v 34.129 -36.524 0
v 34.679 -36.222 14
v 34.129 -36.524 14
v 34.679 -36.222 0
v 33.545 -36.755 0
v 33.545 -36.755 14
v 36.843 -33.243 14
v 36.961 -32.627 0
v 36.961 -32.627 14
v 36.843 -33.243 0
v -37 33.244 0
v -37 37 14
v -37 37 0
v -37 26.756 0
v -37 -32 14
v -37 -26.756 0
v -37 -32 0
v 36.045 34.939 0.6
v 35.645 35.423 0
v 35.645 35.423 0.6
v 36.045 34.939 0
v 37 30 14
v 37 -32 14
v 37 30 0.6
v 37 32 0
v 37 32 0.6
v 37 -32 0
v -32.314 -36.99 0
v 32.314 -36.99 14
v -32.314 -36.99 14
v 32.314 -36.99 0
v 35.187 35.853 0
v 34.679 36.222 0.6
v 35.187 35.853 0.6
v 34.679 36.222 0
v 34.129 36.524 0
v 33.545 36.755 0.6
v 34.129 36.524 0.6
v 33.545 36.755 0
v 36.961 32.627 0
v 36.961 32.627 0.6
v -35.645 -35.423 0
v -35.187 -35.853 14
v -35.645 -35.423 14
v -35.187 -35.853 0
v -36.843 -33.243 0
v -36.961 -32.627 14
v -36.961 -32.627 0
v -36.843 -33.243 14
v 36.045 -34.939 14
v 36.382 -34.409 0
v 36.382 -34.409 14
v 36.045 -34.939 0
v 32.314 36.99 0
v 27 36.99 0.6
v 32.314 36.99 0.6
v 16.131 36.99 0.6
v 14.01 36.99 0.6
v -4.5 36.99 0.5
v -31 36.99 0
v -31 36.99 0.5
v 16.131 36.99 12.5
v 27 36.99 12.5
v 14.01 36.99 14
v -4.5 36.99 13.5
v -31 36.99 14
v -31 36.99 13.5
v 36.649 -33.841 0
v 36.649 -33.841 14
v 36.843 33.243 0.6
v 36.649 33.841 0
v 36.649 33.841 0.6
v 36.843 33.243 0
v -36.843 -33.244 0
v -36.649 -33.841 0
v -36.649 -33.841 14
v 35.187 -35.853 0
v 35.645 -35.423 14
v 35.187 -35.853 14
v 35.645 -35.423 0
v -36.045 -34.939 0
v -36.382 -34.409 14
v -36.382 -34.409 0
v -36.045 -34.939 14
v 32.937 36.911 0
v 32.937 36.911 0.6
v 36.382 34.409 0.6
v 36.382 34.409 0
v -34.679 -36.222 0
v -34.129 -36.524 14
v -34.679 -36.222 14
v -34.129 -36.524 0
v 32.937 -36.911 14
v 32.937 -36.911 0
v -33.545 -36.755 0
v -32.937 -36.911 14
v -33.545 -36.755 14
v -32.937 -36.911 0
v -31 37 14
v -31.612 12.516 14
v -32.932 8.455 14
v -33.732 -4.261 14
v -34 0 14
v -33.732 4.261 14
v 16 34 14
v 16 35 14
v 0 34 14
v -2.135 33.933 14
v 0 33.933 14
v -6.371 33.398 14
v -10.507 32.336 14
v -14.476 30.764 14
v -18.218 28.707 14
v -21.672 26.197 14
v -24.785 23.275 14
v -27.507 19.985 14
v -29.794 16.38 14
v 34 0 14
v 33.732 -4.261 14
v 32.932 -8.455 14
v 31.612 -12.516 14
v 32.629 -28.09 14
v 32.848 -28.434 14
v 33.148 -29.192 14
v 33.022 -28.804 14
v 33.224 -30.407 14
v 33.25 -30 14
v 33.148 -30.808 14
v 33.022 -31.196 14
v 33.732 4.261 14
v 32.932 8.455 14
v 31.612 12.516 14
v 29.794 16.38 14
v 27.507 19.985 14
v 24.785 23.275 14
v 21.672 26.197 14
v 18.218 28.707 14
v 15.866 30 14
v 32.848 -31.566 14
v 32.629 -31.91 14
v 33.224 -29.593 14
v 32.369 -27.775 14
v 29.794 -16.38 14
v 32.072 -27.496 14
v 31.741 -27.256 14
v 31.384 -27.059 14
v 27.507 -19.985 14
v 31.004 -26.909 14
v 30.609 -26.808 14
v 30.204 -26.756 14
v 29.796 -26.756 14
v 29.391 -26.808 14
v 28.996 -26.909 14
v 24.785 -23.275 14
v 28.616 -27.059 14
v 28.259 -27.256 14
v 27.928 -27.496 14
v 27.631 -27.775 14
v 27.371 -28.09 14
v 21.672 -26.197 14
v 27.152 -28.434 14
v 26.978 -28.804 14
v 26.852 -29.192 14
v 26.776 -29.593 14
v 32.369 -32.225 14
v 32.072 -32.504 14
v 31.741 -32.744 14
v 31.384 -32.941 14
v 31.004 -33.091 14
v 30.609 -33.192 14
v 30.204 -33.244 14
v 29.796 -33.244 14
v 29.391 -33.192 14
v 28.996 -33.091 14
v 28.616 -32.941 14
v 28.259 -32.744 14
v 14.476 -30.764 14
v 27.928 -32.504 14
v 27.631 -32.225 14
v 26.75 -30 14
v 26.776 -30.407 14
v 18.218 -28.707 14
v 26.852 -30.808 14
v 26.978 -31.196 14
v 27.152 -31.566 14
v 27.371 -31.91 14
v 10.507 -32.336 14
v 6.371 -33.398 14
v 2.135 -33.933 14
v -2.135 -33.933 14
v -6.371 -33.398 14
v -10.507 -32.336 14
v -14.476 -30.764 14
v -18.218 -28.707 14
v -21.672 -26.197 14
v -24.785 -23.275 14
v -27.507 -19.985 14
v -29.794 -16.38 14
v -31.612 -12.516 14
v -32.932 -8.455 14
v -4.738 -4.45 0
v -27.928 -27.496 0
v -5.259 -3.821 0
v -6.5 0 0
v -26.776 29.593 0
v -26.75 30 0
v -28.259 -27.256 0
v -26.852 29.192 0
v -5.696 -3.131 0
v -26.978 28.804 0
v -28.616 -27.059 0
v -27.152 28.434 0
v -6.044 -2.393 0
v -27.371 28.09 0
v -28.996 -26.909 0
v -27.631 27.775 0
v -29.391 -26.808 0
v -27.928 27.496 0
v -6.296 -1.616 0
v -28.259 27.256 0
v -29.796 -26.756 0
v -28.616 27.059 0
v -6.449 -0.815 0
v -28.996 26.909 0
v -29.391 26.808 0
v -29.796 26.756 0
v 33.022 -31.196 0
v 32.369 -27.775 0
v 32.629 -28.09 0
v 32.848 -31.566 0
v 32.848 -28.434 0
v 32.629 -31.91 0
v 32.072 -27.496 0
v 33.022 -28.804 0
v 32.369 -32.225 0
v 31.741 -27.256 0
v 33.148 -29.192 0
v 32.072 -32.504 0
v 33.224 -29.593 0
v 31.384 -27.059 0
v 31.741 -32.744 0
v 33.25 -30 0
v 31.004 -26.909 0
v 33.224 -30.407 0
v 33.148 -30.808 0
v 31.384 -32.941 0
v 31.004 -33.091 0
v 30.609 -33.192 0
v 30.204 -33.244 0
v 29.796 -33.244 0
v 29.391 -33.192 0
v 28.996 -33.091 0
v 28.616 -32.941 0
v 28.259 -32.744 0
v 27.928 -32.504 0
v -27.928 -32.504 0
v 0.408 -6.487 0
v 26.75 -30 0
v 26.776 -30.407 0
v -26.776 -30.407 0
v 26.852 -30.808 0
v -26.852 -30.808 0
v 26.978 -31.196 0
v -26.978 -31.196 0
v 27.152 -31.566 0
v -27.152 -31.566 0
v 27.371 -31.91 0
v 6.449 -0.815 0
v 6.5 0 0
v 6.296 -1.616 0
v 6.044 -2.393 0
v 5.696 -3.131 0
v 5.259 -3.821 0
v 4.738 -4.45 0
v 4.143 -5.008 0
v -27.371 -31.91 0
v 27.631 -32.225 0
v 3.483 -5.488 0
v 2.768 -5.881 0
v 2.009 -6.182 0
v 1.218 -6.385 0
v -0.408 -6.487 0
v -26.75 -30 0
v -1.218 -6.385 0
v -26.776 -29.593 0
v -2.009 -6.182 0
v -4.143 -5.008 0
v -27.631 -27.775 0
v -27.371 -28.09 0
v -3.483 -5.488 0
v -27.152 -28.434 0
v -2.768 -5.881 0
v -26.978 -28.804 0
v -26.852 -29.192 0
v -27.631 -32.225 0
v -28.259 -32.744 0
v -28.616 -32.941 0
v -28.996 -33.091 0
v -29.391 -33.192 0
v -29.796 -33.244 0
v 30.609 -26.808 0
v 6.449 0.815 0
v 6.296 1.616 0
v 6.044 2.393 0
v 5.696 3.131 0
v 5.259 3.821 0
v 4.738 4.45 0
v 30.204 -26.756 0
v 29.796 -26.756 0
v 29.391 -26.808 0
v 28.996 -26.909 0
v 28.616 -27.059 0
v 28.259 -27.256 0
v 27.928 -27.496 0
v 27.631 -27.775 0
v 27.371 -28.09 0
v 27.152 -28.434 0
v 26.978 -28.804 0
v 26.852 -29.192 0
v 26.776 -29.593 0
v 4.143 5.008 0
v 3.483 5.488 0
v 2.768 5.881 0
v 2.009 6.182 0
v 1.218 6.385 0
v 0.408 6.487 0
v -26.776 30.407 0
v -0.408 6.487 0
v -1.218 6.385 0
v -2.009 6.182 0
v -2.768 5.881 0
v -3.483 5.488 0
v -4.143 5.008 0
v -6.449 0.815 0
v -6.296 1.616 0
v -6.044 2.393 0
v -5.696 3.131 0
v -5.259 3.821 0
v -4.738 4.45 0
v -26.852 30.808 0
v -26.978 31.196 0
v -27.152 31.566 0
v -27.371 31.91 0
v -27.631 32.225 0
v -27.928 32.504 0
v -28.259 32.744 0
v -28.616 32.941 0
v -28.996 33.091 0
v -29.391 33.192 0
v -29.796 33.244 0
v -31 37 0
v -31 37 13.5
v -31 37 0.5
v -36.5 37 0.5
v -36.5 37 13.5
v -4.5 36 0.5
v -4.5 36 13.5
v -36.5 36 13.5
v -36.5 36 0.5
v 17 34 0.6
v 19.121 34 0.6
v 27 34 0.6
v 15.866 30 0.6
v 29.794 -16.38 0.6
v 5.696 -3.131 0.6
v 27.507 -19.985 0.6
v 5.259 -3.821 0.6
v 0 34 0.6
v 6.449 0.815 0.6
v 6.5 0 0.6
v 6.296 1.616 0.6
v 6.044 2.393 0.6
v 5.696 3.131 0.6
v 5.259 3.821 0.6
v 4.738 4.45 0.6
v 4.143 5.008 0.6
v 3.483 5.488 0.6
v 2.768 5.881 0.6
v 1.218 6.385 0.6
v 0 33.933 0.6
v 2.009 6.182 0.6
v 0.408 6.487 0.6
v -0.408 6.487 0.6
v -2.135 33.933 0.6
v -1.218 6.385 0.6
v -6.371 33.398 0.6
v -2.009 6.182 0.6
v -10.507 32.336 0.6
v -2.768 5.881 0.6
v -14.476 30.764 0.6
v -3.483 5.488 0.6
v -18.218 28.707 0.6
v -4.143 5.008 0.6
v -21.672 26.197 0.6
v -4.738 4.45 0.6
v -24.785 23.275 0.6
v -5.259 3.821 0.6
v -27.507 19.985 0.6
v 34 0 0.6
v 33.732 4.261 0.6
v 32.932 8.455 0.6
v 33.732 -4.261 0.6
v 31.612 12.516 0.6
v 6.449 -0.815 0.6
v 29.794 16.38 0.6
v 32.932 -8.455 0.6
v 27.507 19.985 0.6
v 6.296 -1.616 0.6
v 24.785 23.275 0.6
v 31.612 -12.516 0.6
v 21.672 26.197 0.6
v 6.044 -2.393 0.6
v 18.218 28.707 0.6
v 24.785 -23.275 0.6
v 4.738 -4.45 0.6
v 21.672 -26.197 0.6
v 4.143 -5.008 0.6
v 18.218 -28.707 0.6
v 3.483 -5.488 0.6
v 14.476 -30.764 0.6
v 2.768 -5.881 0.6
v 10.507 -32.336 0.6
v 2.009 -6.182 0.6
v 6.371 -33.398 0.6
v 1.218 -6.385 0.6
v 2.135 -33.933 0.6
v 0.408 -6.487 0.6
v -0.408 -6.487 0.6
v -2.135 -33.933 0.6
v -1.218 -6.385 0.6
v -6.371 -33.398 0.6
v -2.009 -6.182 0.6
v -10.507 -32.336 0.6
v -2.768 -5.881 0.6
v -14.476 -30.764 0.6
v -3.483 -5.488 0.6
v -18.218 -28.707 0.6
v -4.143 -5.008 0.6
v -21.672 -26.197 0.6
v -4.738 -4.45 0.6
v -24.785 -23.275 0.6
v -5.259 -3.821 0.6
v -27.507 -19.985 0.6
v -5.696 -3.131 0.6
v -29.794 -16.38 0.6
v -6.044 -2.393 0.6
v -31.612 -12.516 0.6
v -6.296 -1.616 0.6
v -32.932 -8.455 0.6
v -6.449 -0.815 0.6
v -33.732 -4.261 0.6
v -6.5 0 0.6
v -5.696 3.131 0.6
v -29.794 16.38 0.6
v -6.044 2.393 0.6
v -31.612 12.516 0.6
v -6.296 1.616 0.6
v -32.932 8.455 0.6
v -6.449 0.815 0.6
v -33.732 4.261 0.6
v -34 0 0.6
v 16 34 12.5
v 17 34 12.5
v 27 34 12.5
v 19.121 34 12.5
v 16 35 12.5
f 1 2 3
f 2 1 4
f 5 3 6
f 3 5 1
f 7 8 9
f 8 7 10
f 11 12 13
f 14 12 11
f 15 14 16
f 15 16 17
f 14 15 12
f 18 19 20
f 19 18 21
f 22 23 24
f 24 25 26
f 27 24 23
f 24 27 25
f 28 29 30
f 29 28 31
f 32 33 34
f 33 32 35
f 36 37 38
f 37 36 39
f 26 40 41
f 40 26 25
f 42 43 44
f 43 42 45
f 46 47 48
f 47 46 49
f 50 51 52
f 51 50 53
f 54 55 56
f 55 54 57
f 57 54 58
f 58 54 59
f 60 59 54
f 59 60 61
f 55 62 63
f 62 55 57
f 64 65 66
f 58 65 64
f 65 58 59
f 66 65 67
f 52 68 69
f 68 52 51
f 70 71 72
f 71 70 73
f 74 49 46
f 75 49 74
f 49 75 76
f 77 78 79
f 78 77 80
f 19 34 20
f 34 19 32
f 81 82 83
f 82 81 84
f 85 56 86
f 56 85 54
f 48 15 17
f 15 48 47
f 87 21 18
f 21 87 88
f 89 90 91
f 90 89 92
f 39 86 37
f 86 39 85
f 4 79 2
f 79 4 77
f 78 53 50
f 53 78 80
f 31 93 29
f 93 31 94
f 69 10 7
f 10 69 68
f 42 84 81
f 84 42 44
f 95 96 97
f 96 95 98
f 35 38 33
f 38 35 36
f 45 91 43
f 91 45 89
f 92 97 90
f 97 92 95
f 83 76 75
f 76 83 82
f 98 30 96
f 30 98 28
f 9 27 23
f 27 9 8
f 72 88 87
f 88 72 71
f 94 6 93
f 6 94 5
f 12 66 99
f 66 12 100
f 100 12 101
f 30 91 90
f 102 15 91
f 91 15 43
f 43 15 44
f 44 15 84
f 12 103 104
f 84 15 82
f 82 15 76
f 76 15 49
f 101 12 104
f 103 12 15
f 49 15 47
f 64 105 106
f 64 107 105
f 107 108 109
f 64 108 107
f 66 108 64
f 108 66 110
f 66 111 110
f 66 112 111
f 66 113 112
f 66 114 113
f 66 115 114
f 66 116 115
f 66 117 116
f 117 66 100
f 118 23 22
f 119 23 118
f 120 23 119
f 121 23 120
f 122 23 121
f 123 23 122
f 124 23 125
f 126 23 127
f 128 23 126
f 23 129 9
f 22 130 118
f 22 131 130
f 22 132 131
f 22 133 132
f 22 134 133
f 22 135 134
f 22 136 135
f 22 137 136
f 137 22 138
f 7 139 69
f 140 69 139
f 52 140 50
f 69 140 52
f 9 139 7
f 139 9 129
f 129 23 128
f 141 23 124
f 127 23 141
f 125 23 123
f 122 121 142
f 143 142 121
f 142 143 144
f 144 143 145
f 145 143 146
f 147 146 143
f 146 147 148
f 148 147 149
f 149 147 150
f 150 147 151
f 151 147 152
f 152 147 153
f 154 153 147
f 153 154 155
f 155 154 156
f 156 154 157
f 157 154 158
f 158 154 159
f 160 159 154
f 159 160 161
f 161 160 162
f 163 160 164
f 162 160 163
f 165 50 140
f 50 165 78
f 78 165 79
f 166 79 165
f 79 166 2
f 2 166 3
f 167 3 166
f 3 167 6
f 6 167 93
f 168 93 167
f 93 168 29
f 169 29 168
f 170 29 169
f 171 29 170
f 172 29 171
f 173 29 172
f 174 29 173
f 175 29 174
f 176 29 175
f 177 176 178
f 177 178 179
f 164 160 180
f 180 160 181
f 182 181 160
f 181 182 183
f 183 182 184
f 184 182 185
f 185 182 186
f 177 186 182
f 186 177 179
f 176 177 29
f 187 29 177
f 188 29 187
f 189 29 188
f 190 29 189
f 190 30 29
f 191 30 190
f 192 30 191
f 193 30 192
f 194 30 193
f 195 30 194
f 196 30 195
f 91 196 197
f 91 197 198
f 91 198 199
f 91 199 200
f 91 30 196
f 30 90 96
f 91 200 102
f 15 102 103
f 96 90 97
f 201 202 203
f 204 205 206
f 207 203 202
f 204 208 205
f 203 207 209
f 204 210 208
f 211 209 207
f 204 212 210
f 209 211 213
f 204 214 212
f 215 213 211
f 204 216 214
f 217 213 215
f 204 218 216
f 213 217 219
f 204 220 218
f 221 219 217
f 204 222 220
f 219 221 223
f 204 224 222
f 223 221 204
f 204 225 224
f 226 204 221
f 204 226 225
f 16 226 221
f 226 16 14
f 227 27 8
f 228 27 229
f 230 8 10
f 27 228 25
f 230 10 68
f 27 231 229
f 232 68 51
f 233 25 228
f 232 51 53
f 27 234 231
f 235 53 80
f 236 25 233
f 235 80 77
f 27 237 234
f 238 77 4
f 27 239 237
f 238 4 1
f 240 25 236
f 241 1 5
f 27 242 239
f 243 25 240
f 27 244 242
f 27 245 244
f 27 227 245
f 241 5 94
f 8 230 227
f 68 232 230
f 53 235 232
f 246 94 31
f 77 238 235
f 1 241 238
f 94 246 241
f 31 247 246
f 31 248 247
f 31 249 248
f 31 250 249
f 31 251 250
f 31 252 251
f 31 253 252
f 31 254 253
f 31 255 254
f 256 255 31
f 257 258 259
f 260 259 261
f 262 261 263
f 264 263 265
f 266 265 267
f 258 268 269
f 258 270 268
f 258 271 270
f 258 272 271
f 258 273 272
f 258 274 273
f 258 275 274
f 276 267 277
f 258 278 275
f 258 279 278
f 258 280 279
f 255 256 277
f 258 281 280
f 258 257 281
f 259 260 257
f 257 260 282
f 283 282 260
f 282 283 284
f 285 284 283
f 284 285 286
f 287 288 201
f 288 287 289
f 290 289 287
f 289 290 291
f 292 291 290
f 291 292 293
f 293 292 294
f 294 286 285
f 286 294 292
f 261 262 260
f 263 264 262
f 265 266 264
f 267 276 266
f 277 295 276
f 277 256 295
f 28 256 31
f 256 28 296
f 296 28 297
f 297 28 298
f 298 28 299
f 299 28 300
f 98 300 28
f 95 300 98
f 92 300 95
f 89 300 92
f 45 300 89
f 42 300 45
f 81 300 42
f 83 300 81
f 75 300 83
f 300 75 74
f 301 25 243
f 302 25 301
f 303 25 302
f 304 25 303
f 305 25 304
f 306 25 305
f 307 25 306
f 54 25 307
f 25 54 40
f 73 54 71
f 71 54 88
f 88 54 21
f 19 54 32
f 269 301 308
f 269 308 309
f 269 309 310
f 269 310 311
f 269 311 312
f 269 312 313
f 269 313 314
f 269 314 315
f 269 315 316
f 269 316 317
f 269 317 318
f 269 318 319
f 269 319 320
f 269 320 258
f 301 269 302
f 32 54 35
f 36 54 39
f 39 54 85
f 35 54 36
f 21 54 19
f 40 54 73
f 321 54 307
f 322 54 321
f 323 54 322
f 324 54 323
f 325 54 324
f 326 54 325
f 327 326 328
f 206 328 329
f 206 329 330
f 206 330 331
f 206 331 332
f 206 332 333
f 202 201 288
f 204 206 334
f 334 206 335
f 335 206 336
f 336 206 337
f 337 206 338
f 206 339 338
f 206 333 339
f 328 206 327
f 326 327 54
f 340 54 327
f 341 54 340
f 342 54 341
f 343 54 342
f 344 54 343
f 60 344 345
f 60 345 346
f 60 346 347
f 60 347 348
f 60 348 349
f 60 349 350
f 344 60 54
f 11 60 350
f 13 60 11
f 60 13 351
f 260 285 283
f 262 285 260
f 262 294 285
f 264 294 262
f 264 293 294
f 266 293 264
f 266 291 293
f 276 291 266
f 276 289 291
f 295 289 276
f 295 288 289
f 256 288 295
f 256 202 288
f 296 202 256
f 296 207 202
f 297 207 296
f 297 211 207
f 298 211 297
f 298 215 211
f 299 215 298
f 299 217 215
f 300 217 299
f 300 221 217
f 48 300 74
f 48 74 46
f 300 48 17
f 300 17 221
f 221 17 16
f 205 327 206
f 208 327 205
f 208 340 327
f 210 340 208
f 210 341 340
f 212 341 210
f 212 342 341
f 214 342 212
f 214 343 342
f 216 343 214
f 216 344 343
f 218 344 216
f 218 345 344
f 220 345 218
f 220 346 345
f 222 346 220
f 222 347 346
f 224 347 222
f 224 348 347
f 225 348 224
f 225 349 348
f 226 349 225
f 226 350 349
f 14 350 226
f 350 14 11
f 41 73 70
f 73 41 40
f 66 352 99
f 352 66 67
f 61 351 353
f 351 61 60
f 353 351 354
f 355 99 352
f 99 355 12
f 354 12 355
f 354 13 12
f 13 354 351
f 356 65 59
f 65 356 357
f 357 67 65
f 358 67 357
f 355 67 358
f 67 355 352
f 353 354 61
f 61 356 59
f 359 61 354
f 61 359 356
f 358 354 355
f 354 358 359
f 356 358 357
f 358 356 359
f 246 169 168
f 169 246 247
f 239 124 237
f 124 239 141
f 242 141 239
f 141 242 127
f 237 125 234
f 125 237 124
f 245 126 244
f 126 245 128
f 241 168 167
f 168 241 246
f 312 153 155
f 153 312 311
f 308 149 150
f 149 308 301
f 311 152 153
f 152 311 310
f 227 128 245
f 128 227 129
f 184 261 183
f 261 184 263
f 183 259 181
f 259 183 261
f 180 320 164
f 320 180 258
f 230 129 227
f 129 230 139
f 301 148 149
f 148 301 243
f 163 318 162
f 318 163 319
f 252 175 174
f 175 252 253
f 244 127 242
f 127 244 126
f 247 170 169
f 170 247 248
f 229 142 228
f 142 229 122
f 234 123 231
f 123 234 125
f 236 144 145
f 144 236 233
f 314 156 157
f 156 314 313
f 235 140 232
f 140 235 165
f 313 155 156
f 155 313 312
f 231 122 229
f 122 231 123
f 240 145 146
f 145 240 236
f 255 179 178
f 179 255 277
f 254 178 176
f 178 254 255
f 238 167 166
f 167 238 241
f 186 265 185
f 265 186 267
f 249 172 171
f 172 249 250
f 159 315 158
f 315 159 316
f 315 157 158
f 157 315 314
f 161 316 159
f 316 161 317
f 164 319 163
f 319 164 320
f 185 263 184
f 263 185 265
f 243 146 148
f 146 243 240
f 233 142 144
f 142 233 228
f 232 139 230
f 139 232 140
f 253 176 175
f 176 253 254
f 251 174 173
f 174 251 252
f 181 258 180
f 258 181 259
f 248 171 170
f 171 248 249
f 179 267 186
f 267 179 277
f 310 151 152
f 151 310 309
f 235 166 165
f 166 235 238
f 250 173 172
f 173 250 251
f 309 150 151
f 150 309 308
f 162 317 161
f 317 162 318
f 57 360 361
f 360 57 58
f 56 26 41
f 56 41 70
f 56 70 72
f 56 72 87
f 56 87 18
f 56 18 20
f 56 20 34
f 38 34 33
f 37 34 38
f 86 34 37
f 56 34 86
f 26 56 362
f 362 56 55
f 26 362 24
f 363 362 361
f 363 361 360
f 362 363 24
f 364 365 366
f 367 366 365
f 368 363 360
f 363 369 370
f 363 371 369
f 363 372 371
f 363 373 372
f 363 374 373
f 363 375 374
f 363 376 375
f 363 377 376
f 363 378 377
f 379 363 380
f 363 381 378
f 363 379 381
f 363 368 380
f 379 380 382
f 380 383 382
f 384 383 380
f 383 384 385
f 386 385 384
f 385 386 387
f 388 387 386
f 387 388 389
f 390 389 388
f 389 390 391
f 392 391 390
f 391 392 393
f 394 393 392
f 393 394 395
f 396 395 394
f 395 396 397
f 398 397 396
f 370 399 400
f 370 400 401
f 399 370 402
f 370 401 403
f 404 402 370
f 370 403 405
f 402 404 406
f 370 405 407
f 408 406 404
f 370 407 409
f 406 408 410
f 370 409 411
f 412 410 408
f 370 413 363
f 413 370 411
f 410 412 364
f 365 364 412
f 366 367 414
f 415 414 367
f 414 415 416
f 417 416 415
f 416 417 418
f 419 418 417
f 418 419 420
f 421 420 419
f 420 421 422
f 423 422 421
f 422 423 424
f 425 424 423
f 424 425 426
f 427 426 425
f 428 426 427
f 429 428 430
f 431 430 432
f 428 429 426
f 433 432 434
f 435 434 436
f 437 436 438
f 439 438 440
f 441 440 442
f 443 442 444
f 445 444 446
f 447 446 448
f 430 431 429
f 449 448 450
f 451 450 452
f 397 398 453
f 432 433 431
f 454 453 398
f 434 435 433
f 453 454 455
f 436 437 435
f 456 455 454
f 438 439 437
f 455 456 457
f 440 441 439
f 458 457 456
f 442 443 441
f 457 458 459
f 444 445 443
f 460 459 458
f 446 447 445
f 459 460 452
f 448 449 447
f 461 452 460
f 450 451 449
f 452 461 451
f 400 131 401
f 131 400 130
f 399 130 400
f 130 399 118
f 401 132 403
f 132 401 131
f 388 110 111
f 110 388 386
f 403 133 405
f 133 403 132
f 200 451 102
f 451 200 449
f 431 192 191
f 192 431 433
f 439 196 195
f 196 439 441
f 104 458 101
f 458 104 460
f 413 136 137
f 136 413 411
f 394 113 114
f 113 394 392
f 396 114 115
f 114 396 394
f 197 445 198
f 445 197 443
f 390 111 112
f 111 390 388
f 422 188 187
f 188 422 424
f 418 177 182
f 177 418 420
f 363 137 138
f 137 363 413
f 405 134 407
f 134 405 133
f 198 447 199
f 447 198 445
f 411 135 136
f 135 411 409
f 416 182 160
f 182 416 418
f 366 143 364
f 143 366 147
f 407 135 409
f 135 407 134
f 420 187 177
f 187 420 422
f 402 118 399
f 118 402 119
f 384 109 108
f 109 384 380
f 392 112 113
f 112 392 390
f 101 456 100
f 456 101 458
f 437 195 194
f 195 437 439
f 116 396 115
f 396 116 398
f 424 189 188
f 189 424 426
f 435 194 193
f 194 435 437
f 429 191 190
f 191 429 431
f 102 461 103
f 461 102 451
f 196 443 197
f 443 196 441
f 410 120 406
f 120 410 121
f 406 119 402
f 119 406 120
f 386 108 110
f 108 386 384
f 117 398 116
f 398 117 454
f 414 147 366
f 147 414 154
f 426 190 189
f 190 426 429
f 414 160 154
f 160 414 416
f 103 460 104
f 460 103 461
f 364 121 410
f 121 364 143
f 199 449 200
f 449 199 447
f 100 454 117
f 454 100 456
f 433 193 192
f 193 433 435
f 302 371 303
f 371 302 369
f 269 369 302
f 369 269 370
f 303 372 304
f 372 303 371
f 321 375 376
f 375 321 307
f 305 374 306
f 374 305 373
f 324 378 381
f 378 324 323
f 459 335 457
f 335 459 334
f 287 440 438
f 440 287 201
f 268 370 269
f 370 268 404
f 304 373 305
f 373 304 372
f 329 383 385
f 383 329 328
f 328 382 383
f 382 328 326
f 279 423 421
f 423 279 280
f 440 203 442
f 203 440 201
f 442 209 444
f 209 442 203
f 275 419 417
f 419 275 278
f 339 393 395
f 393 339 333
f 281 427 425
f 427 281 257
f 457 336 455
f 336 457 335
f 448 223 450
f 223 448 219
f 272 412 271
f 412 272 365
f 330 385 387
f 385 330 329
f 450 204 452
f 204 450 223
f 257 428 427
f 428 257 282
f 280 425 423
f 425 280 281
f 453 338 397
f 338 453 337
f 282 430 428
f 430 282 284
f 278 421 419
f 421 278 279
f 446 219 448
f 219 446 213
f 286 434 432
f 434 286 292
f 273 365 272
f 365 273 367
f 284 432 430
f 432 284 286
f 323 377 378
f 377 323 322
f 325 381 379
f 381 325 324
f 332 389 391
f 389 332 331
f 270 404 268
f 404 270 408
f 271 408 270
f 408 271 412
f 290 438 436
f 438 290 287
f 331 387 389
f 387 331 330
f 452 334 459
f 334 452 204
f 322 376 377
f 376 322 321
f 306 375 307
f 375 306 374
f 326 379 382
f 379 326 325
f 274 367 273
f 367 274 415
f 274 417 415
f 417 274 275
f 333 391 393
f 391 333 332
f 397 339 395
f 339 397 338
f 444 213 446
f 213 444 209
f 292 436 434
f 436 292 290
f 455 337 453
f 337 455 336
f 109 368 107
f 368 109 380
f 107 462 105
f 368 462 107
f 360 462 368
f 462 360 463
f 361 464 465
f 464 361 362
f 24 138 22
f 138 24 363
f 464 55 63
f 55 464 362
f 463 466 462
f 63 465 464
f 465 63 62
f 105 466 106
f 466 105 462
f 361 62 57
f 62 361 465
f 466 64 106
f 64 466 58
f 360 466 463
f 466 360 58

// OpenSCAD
$fn = 50;


difference() {
	union() {
		hull() {
			translate(v = [-32.0000000000, 32.0000000000, 0]) {
				cylinder(h = 14, r = 5);
			}
			translate(v = [32.0000000000, 32.0000000000, 0]) {
				cylinder(h = 14, r = 5);
			}
			translate(v = [-32.0000000000, -32.0000000000, 0]) {
				cylinder(h = 14, r = 5);
			}
			translate(v = [32.0000000000, -32.0000000000, 0]) {
				cylinder(h = 14, r = 5);
			}
		}
		translate(v = [-37.0000000000, 31.0000000000, 0]) {
			cube(size = [6, 6, 14]);
		}
	}
	union() {
		translate(v = [-37.5000000000, -30.0000000000, -250.0000000000]) {
			rotate(a = [0, 0, 0]) {
				difference() {
					union() {
						hull() {
							translate(v = [7.5000000000, 0, 0]) {
								cylinder(h = 250, r = 3.2500000000, r1 = 3.2500000000, r2 = 3.2500000000);
							}
							translate(v = [-7.5000000000, 0, 0]) {
								cylinder(h = 250, r = 3.2500000000, r1 = 3.2500000000, r2 = 3.2500000000);
							}
						}
					}
					union();
				}
			}
		}
		translate(v = [-37.5000000000, 30.0000000000, -250.0000000000]) {
			rotate(a = [0, 0, 0]) {
				difference() {
					union() {
						hull() {
							translate(v = [7.5000000000, 0, 0]) {
								cylinder(h = 250, r = 3.2500000000, r1 = 3.2500000000, r2 = 3.2500000000);
							}
							translate(v = [-7.5000000000, 0, 0]) {
								cylinder(h = 250, r = 3.2500000000, r1 = 3.2500000000, r2 = 3.2500000000);
							}
						}
					}
					union();
				}
			}
		}
		translate(v = [-36.5000000000, 36.0000000000, 0.5000000000]) {
			cube(size = [32, 1, 13.0000000000]);
		}
		translate(v = [30.0000000000, -30.0000000000, -50.0000000000]) {
			cylinder(h = 100, r = 3.2500000000);
		}
		translate(v = [0, 0, 0.6000000000]) {
			cylinder(h = 16.4000000000, r = 34.0000000000);
		}
		translate(v = [0, 0, -7.0000000000]) {
			cylinder(h = 14, r = 6.5000000000);
		}
		translate(v = [0.0000000000, 30.0000000000, 0.6000000000]) {
			cube(size = [37.0000000000, 4, 16.4000000000]);
		}
		translate(v = [27.0000000000, 30.0000000000, 0.6000000000]) {
			cube(size = [10, 7, 16.4000000000]);
		}
		translate(v = [16.0000000000, 30.0000000000, 12.5000000000]) {
			cube(size = [21, 7, 1.5000000000]);
		}
		translate(v = [13.2500000000, 37.7500000000, 0.6000000000]) {
			rotate(a = [0, 0, -45]) {
				cube(size = [7.5000000000, 1.5000000000, 16.4000000000]);
			}
		}
		translate(v = [7.0610000000, 28.0000000000, 0.6000000000]) {
			cube(size = [7.5000000000, 2, 13.4000000000]);
		}
	}
}
